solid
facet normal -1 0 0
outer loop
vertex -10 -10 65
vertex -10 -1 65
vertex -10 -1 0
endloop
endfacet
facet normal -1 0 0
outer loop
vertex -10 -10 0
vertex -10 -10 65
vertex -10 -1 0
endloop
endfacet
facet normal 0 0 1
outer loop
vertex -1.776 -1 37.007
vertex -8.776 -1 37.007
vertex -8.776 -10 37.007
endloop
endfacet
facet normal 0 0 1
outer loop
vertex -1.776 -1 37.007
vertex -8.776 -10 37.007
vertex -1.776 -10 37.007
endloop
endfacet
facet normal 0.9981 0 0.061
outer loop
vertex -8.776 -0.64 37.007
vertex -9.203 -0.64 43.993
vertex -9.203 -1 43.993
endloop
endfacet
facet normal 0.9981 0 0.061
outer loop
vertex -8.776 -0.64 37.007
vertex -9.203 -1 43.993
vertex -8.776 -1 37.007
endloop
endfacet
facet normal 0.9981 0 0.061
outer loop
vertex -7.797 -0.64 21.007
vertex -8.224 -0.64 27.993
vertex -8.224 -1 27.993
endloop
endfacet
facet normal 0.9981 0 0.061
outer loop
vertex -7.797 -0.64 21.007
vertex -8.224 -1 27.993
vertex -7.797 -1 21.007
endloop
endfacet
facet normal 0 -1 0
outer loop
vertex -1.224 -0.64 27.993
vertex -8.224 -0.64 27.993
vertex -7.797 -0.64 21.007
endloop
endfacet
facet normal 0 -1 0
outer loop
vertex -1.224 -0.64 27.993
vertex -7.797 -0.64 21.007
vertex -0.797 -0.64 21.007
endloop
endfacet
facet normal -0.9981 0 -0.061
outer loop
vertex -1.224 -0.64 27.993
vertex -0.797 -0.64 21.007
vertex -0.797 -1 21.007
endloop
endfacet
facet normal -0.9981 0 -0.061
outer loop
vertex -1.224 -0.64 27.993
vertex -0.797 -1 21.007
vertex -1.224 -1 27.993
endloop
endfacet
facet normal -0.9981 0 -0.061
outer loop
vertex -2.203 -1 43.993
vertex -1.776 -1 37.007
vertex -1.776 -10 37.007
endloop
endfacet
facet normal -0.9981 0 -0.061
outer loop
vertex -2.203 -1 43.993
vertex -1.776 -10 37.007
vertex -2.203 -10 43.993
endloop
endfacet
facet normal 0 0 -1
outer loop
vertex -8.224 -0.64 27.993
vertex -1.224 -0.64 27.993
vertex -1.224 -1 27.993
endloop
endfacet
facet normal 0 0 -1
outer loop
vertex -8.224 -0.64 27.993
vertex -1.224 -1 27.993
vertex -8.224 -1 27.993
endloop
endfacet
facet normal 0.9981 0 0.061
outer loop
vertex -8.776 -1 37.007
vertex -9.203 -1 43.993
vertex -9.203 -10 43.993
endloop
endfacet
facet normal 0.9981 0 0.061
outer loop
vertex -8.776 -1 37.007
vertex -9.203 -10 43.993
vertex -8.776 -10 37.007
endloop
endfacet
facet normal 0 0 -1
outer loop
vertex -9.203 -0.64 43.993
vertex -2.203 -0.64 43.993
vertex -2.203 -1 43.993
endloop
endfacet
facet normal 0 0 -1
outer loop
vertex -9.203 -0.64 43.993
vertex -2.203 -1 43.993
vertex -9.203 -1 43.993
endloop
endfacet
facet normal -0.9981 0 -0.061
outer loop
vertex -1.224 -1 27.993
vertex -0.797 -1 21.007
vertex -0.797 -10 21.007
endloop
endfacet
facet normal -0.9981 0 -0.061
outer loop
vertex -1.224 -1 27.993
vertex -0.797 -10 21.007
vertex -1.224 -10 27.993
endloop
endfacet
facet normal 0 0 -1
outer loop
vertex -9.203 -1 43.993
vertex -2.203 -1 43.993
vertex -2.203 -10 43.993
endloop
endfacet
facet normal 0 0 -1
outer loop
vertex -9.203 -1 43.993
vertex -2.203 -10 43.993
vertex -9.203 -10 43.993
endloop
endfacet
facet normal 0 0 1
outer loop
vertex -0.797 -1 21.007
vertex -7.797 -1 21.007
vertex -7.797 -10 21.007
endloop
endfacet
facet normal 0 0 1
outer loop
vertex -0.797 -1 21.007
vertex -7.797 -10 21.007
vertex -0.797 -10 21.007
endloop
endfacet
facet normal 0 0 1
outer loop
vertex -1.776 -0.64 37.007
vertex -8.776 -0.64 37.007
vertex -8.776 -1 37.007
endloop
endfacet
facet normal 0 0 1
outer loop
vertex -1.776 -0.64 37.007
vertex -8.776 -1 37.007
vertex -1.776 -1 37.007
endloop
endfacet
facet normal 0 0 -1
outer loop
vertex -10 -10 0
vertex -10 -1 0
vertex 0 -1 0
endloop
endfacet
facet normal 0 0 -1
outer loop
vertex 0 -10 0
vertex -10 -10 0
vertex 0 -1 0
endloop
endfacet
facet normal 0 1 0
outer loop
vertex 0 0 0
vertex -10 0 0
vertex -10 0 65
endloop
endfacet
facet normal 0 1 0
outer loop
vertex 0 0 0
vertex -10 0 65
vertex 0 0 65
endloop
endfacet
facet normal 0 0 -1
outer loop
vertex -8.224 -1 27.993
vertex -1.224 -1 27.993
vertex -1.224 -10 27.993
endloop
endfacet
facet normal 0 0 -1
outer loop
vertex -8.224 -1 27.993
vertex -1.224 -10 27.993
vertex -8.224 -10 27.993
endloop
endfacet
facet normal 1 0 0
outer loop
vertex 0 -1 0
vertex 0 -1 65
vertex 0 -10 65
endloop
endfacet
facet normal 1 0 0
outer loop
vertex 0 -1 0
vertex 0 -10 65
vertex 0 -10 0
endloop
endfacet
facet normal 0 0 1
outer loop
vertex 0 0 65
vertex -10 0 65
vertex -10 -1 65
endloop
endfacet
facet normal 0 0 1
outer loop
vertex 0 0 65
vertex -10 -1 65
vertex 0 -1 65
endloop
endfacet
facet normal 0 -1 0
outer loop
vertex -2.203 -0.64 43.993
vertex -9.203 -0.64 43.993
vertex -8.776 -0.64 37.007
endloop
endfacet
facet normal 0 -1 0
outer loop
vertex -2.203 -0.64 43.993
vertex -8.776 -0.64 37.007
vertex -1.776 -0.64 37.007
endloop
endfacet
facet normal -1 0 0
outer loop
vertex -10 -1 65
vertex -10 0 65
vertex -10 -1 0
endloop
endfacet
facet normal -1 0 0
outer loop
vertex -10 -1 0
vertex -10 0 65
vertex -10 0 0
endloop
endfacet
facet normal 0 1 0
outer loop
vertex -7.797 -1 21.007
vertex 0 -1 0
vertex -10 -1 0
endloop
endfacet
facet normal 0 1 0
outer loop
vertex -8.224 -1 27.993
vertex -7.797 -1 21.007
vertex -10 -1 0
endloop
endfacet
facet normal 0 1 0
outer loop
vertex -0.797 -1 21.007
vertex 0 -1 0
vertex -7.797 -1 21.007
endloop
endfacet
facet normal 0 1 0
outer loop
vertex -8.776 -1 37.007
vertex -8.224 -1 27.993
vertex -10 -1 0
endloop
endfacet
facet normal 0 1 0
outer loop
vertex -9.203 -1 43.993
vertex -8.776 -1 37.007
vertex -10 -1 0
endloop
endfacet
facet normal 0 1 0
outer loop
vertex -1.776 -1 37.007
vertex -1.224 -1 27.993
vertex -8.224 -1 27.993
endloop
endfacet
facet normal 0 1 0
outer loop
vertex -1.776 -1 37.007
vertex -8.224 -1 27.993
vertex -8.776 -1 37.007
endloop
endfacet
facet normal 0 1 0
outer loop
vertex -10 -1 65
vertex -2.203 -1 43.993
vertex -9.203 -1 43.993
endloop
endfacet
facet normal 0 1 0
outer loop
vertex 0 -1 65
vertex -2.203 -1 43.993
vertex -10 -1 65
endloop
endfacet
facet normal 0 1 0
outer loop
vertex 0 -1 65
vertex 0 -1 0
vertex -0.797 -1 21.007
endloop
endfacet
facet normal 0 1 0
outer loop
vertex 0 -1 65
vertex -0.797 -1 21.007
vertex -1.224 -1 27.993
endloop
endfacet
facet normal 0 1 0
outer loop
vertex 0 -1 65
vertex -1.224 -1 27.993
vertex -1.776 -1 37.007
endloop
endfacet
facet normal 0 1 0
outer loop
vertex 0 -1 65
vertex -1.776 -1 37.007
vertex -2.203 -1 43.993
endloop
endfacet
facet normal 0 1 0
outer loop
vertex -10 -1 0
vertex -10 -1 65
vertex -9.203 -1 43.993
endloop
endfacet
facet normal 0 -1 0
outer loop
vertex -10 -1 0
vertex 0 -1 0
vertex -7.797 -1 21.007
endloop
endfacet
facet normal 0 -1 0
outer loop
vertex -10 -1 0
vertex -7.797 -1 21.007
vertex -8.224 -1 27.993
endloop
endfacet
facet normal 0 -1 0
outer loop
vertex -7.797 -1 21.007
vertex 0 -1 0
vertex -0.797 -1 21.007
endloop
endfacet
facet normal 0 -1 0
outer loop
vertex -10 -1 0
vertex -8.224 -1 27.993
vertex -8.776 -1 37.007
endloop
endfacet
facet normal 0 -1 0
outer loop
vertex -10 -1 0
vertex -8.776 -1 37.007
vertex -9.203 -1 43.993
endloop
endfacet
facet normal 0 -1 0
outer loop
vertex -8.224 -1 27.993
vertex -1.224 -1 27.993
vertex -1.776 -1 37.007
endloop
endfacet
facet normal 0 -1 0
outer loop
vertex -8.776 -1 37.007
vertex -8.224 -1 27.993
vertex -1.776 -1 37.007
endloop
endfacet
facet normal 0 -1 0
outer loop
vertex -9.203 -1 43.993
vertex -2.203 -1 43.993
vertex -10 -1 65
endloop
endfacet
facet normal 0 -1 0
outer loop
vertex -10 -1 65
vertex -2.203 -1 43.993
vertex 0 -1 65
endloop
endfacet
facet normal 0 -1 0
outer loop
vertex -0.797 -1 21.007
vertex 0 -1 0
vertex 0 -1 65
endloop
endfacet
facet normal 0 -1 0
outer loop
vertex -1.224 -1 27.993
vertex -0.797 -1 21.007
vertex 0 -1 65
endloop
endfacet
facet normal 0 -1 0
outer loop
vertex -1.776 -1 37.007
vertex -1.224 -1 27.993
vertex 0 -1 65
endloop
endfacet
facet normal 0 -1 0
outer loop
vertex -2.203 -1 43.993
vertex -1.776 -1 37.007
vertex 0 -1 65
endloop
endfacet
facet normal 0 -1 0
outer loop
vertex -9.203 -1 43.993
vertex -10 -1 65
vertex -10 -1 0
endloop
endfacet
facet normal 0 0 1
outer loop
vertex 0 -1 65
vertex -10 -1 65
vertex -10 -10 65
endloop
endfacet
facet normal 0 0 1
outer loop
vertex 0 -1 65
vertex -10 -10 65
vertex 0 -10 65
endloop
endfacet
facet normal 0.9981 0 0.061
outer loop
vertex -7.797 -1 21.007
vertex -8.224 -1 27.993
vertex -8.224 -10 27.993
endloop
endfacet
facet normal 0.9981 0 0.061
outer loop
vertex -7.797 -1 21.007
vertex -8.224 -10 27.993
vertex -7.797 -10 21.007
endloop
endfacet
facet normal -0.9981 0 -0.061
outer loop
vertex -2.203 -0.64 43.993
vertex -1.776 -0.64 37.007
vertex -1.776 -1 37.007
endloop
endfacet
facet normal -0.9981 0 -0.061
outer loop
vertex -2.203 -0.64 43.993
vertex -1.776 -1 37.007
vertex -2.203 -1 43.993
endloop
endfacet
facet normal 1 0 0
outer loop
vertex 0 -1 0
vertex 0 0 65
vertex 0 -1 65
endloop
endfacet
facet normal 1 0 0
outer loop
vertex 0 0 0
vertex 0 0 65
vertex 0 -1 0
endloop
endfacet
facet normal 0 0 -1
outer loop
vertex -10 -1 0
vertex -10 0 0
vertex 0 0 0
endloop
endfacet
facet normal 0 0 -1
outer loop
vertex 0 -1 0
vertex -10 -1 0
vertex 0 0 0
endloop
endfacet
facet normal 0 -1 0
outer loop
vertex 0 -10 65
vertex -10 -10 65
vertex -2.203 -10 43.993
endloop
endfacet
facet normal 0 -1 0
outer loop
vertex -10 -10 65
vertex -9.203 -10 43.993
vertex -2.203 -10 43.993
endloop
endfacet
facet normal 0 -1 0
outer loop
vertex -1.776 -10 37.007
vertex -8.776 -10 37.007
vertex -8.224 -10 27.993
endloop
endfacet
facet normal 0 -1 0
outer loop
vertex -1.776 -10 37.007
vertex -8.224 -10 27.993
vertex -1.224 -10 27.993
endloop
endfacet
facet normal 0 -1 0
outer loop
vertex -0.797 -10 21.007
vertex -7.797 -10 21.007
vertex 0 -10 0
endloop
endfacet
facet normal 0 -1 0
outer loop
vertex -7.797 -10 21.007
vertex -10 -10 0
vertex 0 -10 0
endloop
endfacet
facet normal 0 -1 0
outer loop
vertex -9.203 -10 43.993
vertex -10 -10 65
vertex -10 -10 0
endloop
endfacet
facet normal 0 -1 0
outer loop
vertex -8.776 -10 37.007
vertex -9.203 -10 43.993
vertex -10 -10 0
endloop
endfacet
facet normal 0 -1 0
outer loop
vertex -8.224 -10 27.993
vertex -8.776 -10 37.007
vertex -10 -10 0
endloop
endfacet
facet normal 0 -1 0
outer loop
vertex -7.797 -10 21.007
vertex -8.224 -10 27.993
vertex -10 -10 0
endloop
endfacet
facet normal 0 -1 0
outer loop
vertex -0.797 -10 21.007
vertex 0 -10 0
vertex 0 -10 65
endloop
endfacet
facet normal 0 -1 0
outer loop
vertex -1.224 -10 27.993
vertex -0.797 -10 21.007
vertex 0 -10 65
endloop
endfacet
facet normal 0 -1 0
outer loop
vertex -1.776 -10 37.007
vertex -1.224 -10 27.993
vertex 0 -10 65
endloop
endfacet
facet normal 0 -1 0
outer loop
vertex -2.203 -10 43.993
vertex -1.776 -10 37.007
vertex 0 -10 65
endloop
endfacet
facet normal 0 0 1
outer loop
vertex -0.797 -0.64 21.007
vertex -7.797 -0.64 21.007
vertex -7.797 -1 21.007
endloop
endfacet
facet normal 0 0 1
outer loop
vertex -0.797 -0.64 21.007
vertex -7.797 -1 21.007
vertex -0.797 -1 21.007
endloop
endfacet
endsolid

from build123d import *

# Parameters (mm, degrees)
SKETCH1_W           = 10
SKETCH1_H           = 65
BOSS_EXTRUDE1_DEPTH = 0.64
SKETCH1_2_W         = 10
SKETCH1_2_H         = 65
BOSS_EXTRUDE2_DEPTH = 10


with BuildPart() as part:
    # Sketch1 → Boss-Extrude1 (new body)
    with BuildSketch(Plane(origin=(0, 0, 0), x_dir=(1, 0, 0), z_dir=(0, 1, 0))):
        with Locations((-5, -32.5)):
            Rectangle(SKETCH1_W, SKETCH1_H)
    extrude(amount=-BOSS_EXTRUDE1_DEPTH)

    # Sketch1<2> → Boss-Extrude2 (add)
    with BuildSketch(Plane(origin=(0, 0, 0), x_dir=(1, 0, 0), z_dir=(0, 1, 0))):
        with Locations((-5, -32.5)):
            Rectangle(SKETCH1_2_W, SKETCH1_2_H)
        Polygon((-8.224368927, -27.993471794), (-7.79702915, -21.006528206), (-0.79702915, -21.006528206), (-1.224368927, -27.993471794), align=None, mode=Mode.SUBTRACT)
        Polygon((-8.775631073, -37.006528206), (-1.775631073, -37.006528206), (-2.20297085, -43.993471794), (-9.20297085, -43.993471794), align=None, mode=Mode.SUBTRACT)
    extrude(amount=-BOSS_EXTRUDE2_DEPTH)


with BuildPart() as body_2:
    # Split1: the piece on the far side of the plane
    add(part.part)
    split(bisect_by=Plane.ZX.offset(-1), keep=Keep.BOTTOM)


with BuildPart() as part_1:
    add(part.part)

    # Split1
    split(bisect_by=Plane.ZX.offset(-1), keep=Keep.TOP)


solid = Compound([body_2.part, part_1.part])
